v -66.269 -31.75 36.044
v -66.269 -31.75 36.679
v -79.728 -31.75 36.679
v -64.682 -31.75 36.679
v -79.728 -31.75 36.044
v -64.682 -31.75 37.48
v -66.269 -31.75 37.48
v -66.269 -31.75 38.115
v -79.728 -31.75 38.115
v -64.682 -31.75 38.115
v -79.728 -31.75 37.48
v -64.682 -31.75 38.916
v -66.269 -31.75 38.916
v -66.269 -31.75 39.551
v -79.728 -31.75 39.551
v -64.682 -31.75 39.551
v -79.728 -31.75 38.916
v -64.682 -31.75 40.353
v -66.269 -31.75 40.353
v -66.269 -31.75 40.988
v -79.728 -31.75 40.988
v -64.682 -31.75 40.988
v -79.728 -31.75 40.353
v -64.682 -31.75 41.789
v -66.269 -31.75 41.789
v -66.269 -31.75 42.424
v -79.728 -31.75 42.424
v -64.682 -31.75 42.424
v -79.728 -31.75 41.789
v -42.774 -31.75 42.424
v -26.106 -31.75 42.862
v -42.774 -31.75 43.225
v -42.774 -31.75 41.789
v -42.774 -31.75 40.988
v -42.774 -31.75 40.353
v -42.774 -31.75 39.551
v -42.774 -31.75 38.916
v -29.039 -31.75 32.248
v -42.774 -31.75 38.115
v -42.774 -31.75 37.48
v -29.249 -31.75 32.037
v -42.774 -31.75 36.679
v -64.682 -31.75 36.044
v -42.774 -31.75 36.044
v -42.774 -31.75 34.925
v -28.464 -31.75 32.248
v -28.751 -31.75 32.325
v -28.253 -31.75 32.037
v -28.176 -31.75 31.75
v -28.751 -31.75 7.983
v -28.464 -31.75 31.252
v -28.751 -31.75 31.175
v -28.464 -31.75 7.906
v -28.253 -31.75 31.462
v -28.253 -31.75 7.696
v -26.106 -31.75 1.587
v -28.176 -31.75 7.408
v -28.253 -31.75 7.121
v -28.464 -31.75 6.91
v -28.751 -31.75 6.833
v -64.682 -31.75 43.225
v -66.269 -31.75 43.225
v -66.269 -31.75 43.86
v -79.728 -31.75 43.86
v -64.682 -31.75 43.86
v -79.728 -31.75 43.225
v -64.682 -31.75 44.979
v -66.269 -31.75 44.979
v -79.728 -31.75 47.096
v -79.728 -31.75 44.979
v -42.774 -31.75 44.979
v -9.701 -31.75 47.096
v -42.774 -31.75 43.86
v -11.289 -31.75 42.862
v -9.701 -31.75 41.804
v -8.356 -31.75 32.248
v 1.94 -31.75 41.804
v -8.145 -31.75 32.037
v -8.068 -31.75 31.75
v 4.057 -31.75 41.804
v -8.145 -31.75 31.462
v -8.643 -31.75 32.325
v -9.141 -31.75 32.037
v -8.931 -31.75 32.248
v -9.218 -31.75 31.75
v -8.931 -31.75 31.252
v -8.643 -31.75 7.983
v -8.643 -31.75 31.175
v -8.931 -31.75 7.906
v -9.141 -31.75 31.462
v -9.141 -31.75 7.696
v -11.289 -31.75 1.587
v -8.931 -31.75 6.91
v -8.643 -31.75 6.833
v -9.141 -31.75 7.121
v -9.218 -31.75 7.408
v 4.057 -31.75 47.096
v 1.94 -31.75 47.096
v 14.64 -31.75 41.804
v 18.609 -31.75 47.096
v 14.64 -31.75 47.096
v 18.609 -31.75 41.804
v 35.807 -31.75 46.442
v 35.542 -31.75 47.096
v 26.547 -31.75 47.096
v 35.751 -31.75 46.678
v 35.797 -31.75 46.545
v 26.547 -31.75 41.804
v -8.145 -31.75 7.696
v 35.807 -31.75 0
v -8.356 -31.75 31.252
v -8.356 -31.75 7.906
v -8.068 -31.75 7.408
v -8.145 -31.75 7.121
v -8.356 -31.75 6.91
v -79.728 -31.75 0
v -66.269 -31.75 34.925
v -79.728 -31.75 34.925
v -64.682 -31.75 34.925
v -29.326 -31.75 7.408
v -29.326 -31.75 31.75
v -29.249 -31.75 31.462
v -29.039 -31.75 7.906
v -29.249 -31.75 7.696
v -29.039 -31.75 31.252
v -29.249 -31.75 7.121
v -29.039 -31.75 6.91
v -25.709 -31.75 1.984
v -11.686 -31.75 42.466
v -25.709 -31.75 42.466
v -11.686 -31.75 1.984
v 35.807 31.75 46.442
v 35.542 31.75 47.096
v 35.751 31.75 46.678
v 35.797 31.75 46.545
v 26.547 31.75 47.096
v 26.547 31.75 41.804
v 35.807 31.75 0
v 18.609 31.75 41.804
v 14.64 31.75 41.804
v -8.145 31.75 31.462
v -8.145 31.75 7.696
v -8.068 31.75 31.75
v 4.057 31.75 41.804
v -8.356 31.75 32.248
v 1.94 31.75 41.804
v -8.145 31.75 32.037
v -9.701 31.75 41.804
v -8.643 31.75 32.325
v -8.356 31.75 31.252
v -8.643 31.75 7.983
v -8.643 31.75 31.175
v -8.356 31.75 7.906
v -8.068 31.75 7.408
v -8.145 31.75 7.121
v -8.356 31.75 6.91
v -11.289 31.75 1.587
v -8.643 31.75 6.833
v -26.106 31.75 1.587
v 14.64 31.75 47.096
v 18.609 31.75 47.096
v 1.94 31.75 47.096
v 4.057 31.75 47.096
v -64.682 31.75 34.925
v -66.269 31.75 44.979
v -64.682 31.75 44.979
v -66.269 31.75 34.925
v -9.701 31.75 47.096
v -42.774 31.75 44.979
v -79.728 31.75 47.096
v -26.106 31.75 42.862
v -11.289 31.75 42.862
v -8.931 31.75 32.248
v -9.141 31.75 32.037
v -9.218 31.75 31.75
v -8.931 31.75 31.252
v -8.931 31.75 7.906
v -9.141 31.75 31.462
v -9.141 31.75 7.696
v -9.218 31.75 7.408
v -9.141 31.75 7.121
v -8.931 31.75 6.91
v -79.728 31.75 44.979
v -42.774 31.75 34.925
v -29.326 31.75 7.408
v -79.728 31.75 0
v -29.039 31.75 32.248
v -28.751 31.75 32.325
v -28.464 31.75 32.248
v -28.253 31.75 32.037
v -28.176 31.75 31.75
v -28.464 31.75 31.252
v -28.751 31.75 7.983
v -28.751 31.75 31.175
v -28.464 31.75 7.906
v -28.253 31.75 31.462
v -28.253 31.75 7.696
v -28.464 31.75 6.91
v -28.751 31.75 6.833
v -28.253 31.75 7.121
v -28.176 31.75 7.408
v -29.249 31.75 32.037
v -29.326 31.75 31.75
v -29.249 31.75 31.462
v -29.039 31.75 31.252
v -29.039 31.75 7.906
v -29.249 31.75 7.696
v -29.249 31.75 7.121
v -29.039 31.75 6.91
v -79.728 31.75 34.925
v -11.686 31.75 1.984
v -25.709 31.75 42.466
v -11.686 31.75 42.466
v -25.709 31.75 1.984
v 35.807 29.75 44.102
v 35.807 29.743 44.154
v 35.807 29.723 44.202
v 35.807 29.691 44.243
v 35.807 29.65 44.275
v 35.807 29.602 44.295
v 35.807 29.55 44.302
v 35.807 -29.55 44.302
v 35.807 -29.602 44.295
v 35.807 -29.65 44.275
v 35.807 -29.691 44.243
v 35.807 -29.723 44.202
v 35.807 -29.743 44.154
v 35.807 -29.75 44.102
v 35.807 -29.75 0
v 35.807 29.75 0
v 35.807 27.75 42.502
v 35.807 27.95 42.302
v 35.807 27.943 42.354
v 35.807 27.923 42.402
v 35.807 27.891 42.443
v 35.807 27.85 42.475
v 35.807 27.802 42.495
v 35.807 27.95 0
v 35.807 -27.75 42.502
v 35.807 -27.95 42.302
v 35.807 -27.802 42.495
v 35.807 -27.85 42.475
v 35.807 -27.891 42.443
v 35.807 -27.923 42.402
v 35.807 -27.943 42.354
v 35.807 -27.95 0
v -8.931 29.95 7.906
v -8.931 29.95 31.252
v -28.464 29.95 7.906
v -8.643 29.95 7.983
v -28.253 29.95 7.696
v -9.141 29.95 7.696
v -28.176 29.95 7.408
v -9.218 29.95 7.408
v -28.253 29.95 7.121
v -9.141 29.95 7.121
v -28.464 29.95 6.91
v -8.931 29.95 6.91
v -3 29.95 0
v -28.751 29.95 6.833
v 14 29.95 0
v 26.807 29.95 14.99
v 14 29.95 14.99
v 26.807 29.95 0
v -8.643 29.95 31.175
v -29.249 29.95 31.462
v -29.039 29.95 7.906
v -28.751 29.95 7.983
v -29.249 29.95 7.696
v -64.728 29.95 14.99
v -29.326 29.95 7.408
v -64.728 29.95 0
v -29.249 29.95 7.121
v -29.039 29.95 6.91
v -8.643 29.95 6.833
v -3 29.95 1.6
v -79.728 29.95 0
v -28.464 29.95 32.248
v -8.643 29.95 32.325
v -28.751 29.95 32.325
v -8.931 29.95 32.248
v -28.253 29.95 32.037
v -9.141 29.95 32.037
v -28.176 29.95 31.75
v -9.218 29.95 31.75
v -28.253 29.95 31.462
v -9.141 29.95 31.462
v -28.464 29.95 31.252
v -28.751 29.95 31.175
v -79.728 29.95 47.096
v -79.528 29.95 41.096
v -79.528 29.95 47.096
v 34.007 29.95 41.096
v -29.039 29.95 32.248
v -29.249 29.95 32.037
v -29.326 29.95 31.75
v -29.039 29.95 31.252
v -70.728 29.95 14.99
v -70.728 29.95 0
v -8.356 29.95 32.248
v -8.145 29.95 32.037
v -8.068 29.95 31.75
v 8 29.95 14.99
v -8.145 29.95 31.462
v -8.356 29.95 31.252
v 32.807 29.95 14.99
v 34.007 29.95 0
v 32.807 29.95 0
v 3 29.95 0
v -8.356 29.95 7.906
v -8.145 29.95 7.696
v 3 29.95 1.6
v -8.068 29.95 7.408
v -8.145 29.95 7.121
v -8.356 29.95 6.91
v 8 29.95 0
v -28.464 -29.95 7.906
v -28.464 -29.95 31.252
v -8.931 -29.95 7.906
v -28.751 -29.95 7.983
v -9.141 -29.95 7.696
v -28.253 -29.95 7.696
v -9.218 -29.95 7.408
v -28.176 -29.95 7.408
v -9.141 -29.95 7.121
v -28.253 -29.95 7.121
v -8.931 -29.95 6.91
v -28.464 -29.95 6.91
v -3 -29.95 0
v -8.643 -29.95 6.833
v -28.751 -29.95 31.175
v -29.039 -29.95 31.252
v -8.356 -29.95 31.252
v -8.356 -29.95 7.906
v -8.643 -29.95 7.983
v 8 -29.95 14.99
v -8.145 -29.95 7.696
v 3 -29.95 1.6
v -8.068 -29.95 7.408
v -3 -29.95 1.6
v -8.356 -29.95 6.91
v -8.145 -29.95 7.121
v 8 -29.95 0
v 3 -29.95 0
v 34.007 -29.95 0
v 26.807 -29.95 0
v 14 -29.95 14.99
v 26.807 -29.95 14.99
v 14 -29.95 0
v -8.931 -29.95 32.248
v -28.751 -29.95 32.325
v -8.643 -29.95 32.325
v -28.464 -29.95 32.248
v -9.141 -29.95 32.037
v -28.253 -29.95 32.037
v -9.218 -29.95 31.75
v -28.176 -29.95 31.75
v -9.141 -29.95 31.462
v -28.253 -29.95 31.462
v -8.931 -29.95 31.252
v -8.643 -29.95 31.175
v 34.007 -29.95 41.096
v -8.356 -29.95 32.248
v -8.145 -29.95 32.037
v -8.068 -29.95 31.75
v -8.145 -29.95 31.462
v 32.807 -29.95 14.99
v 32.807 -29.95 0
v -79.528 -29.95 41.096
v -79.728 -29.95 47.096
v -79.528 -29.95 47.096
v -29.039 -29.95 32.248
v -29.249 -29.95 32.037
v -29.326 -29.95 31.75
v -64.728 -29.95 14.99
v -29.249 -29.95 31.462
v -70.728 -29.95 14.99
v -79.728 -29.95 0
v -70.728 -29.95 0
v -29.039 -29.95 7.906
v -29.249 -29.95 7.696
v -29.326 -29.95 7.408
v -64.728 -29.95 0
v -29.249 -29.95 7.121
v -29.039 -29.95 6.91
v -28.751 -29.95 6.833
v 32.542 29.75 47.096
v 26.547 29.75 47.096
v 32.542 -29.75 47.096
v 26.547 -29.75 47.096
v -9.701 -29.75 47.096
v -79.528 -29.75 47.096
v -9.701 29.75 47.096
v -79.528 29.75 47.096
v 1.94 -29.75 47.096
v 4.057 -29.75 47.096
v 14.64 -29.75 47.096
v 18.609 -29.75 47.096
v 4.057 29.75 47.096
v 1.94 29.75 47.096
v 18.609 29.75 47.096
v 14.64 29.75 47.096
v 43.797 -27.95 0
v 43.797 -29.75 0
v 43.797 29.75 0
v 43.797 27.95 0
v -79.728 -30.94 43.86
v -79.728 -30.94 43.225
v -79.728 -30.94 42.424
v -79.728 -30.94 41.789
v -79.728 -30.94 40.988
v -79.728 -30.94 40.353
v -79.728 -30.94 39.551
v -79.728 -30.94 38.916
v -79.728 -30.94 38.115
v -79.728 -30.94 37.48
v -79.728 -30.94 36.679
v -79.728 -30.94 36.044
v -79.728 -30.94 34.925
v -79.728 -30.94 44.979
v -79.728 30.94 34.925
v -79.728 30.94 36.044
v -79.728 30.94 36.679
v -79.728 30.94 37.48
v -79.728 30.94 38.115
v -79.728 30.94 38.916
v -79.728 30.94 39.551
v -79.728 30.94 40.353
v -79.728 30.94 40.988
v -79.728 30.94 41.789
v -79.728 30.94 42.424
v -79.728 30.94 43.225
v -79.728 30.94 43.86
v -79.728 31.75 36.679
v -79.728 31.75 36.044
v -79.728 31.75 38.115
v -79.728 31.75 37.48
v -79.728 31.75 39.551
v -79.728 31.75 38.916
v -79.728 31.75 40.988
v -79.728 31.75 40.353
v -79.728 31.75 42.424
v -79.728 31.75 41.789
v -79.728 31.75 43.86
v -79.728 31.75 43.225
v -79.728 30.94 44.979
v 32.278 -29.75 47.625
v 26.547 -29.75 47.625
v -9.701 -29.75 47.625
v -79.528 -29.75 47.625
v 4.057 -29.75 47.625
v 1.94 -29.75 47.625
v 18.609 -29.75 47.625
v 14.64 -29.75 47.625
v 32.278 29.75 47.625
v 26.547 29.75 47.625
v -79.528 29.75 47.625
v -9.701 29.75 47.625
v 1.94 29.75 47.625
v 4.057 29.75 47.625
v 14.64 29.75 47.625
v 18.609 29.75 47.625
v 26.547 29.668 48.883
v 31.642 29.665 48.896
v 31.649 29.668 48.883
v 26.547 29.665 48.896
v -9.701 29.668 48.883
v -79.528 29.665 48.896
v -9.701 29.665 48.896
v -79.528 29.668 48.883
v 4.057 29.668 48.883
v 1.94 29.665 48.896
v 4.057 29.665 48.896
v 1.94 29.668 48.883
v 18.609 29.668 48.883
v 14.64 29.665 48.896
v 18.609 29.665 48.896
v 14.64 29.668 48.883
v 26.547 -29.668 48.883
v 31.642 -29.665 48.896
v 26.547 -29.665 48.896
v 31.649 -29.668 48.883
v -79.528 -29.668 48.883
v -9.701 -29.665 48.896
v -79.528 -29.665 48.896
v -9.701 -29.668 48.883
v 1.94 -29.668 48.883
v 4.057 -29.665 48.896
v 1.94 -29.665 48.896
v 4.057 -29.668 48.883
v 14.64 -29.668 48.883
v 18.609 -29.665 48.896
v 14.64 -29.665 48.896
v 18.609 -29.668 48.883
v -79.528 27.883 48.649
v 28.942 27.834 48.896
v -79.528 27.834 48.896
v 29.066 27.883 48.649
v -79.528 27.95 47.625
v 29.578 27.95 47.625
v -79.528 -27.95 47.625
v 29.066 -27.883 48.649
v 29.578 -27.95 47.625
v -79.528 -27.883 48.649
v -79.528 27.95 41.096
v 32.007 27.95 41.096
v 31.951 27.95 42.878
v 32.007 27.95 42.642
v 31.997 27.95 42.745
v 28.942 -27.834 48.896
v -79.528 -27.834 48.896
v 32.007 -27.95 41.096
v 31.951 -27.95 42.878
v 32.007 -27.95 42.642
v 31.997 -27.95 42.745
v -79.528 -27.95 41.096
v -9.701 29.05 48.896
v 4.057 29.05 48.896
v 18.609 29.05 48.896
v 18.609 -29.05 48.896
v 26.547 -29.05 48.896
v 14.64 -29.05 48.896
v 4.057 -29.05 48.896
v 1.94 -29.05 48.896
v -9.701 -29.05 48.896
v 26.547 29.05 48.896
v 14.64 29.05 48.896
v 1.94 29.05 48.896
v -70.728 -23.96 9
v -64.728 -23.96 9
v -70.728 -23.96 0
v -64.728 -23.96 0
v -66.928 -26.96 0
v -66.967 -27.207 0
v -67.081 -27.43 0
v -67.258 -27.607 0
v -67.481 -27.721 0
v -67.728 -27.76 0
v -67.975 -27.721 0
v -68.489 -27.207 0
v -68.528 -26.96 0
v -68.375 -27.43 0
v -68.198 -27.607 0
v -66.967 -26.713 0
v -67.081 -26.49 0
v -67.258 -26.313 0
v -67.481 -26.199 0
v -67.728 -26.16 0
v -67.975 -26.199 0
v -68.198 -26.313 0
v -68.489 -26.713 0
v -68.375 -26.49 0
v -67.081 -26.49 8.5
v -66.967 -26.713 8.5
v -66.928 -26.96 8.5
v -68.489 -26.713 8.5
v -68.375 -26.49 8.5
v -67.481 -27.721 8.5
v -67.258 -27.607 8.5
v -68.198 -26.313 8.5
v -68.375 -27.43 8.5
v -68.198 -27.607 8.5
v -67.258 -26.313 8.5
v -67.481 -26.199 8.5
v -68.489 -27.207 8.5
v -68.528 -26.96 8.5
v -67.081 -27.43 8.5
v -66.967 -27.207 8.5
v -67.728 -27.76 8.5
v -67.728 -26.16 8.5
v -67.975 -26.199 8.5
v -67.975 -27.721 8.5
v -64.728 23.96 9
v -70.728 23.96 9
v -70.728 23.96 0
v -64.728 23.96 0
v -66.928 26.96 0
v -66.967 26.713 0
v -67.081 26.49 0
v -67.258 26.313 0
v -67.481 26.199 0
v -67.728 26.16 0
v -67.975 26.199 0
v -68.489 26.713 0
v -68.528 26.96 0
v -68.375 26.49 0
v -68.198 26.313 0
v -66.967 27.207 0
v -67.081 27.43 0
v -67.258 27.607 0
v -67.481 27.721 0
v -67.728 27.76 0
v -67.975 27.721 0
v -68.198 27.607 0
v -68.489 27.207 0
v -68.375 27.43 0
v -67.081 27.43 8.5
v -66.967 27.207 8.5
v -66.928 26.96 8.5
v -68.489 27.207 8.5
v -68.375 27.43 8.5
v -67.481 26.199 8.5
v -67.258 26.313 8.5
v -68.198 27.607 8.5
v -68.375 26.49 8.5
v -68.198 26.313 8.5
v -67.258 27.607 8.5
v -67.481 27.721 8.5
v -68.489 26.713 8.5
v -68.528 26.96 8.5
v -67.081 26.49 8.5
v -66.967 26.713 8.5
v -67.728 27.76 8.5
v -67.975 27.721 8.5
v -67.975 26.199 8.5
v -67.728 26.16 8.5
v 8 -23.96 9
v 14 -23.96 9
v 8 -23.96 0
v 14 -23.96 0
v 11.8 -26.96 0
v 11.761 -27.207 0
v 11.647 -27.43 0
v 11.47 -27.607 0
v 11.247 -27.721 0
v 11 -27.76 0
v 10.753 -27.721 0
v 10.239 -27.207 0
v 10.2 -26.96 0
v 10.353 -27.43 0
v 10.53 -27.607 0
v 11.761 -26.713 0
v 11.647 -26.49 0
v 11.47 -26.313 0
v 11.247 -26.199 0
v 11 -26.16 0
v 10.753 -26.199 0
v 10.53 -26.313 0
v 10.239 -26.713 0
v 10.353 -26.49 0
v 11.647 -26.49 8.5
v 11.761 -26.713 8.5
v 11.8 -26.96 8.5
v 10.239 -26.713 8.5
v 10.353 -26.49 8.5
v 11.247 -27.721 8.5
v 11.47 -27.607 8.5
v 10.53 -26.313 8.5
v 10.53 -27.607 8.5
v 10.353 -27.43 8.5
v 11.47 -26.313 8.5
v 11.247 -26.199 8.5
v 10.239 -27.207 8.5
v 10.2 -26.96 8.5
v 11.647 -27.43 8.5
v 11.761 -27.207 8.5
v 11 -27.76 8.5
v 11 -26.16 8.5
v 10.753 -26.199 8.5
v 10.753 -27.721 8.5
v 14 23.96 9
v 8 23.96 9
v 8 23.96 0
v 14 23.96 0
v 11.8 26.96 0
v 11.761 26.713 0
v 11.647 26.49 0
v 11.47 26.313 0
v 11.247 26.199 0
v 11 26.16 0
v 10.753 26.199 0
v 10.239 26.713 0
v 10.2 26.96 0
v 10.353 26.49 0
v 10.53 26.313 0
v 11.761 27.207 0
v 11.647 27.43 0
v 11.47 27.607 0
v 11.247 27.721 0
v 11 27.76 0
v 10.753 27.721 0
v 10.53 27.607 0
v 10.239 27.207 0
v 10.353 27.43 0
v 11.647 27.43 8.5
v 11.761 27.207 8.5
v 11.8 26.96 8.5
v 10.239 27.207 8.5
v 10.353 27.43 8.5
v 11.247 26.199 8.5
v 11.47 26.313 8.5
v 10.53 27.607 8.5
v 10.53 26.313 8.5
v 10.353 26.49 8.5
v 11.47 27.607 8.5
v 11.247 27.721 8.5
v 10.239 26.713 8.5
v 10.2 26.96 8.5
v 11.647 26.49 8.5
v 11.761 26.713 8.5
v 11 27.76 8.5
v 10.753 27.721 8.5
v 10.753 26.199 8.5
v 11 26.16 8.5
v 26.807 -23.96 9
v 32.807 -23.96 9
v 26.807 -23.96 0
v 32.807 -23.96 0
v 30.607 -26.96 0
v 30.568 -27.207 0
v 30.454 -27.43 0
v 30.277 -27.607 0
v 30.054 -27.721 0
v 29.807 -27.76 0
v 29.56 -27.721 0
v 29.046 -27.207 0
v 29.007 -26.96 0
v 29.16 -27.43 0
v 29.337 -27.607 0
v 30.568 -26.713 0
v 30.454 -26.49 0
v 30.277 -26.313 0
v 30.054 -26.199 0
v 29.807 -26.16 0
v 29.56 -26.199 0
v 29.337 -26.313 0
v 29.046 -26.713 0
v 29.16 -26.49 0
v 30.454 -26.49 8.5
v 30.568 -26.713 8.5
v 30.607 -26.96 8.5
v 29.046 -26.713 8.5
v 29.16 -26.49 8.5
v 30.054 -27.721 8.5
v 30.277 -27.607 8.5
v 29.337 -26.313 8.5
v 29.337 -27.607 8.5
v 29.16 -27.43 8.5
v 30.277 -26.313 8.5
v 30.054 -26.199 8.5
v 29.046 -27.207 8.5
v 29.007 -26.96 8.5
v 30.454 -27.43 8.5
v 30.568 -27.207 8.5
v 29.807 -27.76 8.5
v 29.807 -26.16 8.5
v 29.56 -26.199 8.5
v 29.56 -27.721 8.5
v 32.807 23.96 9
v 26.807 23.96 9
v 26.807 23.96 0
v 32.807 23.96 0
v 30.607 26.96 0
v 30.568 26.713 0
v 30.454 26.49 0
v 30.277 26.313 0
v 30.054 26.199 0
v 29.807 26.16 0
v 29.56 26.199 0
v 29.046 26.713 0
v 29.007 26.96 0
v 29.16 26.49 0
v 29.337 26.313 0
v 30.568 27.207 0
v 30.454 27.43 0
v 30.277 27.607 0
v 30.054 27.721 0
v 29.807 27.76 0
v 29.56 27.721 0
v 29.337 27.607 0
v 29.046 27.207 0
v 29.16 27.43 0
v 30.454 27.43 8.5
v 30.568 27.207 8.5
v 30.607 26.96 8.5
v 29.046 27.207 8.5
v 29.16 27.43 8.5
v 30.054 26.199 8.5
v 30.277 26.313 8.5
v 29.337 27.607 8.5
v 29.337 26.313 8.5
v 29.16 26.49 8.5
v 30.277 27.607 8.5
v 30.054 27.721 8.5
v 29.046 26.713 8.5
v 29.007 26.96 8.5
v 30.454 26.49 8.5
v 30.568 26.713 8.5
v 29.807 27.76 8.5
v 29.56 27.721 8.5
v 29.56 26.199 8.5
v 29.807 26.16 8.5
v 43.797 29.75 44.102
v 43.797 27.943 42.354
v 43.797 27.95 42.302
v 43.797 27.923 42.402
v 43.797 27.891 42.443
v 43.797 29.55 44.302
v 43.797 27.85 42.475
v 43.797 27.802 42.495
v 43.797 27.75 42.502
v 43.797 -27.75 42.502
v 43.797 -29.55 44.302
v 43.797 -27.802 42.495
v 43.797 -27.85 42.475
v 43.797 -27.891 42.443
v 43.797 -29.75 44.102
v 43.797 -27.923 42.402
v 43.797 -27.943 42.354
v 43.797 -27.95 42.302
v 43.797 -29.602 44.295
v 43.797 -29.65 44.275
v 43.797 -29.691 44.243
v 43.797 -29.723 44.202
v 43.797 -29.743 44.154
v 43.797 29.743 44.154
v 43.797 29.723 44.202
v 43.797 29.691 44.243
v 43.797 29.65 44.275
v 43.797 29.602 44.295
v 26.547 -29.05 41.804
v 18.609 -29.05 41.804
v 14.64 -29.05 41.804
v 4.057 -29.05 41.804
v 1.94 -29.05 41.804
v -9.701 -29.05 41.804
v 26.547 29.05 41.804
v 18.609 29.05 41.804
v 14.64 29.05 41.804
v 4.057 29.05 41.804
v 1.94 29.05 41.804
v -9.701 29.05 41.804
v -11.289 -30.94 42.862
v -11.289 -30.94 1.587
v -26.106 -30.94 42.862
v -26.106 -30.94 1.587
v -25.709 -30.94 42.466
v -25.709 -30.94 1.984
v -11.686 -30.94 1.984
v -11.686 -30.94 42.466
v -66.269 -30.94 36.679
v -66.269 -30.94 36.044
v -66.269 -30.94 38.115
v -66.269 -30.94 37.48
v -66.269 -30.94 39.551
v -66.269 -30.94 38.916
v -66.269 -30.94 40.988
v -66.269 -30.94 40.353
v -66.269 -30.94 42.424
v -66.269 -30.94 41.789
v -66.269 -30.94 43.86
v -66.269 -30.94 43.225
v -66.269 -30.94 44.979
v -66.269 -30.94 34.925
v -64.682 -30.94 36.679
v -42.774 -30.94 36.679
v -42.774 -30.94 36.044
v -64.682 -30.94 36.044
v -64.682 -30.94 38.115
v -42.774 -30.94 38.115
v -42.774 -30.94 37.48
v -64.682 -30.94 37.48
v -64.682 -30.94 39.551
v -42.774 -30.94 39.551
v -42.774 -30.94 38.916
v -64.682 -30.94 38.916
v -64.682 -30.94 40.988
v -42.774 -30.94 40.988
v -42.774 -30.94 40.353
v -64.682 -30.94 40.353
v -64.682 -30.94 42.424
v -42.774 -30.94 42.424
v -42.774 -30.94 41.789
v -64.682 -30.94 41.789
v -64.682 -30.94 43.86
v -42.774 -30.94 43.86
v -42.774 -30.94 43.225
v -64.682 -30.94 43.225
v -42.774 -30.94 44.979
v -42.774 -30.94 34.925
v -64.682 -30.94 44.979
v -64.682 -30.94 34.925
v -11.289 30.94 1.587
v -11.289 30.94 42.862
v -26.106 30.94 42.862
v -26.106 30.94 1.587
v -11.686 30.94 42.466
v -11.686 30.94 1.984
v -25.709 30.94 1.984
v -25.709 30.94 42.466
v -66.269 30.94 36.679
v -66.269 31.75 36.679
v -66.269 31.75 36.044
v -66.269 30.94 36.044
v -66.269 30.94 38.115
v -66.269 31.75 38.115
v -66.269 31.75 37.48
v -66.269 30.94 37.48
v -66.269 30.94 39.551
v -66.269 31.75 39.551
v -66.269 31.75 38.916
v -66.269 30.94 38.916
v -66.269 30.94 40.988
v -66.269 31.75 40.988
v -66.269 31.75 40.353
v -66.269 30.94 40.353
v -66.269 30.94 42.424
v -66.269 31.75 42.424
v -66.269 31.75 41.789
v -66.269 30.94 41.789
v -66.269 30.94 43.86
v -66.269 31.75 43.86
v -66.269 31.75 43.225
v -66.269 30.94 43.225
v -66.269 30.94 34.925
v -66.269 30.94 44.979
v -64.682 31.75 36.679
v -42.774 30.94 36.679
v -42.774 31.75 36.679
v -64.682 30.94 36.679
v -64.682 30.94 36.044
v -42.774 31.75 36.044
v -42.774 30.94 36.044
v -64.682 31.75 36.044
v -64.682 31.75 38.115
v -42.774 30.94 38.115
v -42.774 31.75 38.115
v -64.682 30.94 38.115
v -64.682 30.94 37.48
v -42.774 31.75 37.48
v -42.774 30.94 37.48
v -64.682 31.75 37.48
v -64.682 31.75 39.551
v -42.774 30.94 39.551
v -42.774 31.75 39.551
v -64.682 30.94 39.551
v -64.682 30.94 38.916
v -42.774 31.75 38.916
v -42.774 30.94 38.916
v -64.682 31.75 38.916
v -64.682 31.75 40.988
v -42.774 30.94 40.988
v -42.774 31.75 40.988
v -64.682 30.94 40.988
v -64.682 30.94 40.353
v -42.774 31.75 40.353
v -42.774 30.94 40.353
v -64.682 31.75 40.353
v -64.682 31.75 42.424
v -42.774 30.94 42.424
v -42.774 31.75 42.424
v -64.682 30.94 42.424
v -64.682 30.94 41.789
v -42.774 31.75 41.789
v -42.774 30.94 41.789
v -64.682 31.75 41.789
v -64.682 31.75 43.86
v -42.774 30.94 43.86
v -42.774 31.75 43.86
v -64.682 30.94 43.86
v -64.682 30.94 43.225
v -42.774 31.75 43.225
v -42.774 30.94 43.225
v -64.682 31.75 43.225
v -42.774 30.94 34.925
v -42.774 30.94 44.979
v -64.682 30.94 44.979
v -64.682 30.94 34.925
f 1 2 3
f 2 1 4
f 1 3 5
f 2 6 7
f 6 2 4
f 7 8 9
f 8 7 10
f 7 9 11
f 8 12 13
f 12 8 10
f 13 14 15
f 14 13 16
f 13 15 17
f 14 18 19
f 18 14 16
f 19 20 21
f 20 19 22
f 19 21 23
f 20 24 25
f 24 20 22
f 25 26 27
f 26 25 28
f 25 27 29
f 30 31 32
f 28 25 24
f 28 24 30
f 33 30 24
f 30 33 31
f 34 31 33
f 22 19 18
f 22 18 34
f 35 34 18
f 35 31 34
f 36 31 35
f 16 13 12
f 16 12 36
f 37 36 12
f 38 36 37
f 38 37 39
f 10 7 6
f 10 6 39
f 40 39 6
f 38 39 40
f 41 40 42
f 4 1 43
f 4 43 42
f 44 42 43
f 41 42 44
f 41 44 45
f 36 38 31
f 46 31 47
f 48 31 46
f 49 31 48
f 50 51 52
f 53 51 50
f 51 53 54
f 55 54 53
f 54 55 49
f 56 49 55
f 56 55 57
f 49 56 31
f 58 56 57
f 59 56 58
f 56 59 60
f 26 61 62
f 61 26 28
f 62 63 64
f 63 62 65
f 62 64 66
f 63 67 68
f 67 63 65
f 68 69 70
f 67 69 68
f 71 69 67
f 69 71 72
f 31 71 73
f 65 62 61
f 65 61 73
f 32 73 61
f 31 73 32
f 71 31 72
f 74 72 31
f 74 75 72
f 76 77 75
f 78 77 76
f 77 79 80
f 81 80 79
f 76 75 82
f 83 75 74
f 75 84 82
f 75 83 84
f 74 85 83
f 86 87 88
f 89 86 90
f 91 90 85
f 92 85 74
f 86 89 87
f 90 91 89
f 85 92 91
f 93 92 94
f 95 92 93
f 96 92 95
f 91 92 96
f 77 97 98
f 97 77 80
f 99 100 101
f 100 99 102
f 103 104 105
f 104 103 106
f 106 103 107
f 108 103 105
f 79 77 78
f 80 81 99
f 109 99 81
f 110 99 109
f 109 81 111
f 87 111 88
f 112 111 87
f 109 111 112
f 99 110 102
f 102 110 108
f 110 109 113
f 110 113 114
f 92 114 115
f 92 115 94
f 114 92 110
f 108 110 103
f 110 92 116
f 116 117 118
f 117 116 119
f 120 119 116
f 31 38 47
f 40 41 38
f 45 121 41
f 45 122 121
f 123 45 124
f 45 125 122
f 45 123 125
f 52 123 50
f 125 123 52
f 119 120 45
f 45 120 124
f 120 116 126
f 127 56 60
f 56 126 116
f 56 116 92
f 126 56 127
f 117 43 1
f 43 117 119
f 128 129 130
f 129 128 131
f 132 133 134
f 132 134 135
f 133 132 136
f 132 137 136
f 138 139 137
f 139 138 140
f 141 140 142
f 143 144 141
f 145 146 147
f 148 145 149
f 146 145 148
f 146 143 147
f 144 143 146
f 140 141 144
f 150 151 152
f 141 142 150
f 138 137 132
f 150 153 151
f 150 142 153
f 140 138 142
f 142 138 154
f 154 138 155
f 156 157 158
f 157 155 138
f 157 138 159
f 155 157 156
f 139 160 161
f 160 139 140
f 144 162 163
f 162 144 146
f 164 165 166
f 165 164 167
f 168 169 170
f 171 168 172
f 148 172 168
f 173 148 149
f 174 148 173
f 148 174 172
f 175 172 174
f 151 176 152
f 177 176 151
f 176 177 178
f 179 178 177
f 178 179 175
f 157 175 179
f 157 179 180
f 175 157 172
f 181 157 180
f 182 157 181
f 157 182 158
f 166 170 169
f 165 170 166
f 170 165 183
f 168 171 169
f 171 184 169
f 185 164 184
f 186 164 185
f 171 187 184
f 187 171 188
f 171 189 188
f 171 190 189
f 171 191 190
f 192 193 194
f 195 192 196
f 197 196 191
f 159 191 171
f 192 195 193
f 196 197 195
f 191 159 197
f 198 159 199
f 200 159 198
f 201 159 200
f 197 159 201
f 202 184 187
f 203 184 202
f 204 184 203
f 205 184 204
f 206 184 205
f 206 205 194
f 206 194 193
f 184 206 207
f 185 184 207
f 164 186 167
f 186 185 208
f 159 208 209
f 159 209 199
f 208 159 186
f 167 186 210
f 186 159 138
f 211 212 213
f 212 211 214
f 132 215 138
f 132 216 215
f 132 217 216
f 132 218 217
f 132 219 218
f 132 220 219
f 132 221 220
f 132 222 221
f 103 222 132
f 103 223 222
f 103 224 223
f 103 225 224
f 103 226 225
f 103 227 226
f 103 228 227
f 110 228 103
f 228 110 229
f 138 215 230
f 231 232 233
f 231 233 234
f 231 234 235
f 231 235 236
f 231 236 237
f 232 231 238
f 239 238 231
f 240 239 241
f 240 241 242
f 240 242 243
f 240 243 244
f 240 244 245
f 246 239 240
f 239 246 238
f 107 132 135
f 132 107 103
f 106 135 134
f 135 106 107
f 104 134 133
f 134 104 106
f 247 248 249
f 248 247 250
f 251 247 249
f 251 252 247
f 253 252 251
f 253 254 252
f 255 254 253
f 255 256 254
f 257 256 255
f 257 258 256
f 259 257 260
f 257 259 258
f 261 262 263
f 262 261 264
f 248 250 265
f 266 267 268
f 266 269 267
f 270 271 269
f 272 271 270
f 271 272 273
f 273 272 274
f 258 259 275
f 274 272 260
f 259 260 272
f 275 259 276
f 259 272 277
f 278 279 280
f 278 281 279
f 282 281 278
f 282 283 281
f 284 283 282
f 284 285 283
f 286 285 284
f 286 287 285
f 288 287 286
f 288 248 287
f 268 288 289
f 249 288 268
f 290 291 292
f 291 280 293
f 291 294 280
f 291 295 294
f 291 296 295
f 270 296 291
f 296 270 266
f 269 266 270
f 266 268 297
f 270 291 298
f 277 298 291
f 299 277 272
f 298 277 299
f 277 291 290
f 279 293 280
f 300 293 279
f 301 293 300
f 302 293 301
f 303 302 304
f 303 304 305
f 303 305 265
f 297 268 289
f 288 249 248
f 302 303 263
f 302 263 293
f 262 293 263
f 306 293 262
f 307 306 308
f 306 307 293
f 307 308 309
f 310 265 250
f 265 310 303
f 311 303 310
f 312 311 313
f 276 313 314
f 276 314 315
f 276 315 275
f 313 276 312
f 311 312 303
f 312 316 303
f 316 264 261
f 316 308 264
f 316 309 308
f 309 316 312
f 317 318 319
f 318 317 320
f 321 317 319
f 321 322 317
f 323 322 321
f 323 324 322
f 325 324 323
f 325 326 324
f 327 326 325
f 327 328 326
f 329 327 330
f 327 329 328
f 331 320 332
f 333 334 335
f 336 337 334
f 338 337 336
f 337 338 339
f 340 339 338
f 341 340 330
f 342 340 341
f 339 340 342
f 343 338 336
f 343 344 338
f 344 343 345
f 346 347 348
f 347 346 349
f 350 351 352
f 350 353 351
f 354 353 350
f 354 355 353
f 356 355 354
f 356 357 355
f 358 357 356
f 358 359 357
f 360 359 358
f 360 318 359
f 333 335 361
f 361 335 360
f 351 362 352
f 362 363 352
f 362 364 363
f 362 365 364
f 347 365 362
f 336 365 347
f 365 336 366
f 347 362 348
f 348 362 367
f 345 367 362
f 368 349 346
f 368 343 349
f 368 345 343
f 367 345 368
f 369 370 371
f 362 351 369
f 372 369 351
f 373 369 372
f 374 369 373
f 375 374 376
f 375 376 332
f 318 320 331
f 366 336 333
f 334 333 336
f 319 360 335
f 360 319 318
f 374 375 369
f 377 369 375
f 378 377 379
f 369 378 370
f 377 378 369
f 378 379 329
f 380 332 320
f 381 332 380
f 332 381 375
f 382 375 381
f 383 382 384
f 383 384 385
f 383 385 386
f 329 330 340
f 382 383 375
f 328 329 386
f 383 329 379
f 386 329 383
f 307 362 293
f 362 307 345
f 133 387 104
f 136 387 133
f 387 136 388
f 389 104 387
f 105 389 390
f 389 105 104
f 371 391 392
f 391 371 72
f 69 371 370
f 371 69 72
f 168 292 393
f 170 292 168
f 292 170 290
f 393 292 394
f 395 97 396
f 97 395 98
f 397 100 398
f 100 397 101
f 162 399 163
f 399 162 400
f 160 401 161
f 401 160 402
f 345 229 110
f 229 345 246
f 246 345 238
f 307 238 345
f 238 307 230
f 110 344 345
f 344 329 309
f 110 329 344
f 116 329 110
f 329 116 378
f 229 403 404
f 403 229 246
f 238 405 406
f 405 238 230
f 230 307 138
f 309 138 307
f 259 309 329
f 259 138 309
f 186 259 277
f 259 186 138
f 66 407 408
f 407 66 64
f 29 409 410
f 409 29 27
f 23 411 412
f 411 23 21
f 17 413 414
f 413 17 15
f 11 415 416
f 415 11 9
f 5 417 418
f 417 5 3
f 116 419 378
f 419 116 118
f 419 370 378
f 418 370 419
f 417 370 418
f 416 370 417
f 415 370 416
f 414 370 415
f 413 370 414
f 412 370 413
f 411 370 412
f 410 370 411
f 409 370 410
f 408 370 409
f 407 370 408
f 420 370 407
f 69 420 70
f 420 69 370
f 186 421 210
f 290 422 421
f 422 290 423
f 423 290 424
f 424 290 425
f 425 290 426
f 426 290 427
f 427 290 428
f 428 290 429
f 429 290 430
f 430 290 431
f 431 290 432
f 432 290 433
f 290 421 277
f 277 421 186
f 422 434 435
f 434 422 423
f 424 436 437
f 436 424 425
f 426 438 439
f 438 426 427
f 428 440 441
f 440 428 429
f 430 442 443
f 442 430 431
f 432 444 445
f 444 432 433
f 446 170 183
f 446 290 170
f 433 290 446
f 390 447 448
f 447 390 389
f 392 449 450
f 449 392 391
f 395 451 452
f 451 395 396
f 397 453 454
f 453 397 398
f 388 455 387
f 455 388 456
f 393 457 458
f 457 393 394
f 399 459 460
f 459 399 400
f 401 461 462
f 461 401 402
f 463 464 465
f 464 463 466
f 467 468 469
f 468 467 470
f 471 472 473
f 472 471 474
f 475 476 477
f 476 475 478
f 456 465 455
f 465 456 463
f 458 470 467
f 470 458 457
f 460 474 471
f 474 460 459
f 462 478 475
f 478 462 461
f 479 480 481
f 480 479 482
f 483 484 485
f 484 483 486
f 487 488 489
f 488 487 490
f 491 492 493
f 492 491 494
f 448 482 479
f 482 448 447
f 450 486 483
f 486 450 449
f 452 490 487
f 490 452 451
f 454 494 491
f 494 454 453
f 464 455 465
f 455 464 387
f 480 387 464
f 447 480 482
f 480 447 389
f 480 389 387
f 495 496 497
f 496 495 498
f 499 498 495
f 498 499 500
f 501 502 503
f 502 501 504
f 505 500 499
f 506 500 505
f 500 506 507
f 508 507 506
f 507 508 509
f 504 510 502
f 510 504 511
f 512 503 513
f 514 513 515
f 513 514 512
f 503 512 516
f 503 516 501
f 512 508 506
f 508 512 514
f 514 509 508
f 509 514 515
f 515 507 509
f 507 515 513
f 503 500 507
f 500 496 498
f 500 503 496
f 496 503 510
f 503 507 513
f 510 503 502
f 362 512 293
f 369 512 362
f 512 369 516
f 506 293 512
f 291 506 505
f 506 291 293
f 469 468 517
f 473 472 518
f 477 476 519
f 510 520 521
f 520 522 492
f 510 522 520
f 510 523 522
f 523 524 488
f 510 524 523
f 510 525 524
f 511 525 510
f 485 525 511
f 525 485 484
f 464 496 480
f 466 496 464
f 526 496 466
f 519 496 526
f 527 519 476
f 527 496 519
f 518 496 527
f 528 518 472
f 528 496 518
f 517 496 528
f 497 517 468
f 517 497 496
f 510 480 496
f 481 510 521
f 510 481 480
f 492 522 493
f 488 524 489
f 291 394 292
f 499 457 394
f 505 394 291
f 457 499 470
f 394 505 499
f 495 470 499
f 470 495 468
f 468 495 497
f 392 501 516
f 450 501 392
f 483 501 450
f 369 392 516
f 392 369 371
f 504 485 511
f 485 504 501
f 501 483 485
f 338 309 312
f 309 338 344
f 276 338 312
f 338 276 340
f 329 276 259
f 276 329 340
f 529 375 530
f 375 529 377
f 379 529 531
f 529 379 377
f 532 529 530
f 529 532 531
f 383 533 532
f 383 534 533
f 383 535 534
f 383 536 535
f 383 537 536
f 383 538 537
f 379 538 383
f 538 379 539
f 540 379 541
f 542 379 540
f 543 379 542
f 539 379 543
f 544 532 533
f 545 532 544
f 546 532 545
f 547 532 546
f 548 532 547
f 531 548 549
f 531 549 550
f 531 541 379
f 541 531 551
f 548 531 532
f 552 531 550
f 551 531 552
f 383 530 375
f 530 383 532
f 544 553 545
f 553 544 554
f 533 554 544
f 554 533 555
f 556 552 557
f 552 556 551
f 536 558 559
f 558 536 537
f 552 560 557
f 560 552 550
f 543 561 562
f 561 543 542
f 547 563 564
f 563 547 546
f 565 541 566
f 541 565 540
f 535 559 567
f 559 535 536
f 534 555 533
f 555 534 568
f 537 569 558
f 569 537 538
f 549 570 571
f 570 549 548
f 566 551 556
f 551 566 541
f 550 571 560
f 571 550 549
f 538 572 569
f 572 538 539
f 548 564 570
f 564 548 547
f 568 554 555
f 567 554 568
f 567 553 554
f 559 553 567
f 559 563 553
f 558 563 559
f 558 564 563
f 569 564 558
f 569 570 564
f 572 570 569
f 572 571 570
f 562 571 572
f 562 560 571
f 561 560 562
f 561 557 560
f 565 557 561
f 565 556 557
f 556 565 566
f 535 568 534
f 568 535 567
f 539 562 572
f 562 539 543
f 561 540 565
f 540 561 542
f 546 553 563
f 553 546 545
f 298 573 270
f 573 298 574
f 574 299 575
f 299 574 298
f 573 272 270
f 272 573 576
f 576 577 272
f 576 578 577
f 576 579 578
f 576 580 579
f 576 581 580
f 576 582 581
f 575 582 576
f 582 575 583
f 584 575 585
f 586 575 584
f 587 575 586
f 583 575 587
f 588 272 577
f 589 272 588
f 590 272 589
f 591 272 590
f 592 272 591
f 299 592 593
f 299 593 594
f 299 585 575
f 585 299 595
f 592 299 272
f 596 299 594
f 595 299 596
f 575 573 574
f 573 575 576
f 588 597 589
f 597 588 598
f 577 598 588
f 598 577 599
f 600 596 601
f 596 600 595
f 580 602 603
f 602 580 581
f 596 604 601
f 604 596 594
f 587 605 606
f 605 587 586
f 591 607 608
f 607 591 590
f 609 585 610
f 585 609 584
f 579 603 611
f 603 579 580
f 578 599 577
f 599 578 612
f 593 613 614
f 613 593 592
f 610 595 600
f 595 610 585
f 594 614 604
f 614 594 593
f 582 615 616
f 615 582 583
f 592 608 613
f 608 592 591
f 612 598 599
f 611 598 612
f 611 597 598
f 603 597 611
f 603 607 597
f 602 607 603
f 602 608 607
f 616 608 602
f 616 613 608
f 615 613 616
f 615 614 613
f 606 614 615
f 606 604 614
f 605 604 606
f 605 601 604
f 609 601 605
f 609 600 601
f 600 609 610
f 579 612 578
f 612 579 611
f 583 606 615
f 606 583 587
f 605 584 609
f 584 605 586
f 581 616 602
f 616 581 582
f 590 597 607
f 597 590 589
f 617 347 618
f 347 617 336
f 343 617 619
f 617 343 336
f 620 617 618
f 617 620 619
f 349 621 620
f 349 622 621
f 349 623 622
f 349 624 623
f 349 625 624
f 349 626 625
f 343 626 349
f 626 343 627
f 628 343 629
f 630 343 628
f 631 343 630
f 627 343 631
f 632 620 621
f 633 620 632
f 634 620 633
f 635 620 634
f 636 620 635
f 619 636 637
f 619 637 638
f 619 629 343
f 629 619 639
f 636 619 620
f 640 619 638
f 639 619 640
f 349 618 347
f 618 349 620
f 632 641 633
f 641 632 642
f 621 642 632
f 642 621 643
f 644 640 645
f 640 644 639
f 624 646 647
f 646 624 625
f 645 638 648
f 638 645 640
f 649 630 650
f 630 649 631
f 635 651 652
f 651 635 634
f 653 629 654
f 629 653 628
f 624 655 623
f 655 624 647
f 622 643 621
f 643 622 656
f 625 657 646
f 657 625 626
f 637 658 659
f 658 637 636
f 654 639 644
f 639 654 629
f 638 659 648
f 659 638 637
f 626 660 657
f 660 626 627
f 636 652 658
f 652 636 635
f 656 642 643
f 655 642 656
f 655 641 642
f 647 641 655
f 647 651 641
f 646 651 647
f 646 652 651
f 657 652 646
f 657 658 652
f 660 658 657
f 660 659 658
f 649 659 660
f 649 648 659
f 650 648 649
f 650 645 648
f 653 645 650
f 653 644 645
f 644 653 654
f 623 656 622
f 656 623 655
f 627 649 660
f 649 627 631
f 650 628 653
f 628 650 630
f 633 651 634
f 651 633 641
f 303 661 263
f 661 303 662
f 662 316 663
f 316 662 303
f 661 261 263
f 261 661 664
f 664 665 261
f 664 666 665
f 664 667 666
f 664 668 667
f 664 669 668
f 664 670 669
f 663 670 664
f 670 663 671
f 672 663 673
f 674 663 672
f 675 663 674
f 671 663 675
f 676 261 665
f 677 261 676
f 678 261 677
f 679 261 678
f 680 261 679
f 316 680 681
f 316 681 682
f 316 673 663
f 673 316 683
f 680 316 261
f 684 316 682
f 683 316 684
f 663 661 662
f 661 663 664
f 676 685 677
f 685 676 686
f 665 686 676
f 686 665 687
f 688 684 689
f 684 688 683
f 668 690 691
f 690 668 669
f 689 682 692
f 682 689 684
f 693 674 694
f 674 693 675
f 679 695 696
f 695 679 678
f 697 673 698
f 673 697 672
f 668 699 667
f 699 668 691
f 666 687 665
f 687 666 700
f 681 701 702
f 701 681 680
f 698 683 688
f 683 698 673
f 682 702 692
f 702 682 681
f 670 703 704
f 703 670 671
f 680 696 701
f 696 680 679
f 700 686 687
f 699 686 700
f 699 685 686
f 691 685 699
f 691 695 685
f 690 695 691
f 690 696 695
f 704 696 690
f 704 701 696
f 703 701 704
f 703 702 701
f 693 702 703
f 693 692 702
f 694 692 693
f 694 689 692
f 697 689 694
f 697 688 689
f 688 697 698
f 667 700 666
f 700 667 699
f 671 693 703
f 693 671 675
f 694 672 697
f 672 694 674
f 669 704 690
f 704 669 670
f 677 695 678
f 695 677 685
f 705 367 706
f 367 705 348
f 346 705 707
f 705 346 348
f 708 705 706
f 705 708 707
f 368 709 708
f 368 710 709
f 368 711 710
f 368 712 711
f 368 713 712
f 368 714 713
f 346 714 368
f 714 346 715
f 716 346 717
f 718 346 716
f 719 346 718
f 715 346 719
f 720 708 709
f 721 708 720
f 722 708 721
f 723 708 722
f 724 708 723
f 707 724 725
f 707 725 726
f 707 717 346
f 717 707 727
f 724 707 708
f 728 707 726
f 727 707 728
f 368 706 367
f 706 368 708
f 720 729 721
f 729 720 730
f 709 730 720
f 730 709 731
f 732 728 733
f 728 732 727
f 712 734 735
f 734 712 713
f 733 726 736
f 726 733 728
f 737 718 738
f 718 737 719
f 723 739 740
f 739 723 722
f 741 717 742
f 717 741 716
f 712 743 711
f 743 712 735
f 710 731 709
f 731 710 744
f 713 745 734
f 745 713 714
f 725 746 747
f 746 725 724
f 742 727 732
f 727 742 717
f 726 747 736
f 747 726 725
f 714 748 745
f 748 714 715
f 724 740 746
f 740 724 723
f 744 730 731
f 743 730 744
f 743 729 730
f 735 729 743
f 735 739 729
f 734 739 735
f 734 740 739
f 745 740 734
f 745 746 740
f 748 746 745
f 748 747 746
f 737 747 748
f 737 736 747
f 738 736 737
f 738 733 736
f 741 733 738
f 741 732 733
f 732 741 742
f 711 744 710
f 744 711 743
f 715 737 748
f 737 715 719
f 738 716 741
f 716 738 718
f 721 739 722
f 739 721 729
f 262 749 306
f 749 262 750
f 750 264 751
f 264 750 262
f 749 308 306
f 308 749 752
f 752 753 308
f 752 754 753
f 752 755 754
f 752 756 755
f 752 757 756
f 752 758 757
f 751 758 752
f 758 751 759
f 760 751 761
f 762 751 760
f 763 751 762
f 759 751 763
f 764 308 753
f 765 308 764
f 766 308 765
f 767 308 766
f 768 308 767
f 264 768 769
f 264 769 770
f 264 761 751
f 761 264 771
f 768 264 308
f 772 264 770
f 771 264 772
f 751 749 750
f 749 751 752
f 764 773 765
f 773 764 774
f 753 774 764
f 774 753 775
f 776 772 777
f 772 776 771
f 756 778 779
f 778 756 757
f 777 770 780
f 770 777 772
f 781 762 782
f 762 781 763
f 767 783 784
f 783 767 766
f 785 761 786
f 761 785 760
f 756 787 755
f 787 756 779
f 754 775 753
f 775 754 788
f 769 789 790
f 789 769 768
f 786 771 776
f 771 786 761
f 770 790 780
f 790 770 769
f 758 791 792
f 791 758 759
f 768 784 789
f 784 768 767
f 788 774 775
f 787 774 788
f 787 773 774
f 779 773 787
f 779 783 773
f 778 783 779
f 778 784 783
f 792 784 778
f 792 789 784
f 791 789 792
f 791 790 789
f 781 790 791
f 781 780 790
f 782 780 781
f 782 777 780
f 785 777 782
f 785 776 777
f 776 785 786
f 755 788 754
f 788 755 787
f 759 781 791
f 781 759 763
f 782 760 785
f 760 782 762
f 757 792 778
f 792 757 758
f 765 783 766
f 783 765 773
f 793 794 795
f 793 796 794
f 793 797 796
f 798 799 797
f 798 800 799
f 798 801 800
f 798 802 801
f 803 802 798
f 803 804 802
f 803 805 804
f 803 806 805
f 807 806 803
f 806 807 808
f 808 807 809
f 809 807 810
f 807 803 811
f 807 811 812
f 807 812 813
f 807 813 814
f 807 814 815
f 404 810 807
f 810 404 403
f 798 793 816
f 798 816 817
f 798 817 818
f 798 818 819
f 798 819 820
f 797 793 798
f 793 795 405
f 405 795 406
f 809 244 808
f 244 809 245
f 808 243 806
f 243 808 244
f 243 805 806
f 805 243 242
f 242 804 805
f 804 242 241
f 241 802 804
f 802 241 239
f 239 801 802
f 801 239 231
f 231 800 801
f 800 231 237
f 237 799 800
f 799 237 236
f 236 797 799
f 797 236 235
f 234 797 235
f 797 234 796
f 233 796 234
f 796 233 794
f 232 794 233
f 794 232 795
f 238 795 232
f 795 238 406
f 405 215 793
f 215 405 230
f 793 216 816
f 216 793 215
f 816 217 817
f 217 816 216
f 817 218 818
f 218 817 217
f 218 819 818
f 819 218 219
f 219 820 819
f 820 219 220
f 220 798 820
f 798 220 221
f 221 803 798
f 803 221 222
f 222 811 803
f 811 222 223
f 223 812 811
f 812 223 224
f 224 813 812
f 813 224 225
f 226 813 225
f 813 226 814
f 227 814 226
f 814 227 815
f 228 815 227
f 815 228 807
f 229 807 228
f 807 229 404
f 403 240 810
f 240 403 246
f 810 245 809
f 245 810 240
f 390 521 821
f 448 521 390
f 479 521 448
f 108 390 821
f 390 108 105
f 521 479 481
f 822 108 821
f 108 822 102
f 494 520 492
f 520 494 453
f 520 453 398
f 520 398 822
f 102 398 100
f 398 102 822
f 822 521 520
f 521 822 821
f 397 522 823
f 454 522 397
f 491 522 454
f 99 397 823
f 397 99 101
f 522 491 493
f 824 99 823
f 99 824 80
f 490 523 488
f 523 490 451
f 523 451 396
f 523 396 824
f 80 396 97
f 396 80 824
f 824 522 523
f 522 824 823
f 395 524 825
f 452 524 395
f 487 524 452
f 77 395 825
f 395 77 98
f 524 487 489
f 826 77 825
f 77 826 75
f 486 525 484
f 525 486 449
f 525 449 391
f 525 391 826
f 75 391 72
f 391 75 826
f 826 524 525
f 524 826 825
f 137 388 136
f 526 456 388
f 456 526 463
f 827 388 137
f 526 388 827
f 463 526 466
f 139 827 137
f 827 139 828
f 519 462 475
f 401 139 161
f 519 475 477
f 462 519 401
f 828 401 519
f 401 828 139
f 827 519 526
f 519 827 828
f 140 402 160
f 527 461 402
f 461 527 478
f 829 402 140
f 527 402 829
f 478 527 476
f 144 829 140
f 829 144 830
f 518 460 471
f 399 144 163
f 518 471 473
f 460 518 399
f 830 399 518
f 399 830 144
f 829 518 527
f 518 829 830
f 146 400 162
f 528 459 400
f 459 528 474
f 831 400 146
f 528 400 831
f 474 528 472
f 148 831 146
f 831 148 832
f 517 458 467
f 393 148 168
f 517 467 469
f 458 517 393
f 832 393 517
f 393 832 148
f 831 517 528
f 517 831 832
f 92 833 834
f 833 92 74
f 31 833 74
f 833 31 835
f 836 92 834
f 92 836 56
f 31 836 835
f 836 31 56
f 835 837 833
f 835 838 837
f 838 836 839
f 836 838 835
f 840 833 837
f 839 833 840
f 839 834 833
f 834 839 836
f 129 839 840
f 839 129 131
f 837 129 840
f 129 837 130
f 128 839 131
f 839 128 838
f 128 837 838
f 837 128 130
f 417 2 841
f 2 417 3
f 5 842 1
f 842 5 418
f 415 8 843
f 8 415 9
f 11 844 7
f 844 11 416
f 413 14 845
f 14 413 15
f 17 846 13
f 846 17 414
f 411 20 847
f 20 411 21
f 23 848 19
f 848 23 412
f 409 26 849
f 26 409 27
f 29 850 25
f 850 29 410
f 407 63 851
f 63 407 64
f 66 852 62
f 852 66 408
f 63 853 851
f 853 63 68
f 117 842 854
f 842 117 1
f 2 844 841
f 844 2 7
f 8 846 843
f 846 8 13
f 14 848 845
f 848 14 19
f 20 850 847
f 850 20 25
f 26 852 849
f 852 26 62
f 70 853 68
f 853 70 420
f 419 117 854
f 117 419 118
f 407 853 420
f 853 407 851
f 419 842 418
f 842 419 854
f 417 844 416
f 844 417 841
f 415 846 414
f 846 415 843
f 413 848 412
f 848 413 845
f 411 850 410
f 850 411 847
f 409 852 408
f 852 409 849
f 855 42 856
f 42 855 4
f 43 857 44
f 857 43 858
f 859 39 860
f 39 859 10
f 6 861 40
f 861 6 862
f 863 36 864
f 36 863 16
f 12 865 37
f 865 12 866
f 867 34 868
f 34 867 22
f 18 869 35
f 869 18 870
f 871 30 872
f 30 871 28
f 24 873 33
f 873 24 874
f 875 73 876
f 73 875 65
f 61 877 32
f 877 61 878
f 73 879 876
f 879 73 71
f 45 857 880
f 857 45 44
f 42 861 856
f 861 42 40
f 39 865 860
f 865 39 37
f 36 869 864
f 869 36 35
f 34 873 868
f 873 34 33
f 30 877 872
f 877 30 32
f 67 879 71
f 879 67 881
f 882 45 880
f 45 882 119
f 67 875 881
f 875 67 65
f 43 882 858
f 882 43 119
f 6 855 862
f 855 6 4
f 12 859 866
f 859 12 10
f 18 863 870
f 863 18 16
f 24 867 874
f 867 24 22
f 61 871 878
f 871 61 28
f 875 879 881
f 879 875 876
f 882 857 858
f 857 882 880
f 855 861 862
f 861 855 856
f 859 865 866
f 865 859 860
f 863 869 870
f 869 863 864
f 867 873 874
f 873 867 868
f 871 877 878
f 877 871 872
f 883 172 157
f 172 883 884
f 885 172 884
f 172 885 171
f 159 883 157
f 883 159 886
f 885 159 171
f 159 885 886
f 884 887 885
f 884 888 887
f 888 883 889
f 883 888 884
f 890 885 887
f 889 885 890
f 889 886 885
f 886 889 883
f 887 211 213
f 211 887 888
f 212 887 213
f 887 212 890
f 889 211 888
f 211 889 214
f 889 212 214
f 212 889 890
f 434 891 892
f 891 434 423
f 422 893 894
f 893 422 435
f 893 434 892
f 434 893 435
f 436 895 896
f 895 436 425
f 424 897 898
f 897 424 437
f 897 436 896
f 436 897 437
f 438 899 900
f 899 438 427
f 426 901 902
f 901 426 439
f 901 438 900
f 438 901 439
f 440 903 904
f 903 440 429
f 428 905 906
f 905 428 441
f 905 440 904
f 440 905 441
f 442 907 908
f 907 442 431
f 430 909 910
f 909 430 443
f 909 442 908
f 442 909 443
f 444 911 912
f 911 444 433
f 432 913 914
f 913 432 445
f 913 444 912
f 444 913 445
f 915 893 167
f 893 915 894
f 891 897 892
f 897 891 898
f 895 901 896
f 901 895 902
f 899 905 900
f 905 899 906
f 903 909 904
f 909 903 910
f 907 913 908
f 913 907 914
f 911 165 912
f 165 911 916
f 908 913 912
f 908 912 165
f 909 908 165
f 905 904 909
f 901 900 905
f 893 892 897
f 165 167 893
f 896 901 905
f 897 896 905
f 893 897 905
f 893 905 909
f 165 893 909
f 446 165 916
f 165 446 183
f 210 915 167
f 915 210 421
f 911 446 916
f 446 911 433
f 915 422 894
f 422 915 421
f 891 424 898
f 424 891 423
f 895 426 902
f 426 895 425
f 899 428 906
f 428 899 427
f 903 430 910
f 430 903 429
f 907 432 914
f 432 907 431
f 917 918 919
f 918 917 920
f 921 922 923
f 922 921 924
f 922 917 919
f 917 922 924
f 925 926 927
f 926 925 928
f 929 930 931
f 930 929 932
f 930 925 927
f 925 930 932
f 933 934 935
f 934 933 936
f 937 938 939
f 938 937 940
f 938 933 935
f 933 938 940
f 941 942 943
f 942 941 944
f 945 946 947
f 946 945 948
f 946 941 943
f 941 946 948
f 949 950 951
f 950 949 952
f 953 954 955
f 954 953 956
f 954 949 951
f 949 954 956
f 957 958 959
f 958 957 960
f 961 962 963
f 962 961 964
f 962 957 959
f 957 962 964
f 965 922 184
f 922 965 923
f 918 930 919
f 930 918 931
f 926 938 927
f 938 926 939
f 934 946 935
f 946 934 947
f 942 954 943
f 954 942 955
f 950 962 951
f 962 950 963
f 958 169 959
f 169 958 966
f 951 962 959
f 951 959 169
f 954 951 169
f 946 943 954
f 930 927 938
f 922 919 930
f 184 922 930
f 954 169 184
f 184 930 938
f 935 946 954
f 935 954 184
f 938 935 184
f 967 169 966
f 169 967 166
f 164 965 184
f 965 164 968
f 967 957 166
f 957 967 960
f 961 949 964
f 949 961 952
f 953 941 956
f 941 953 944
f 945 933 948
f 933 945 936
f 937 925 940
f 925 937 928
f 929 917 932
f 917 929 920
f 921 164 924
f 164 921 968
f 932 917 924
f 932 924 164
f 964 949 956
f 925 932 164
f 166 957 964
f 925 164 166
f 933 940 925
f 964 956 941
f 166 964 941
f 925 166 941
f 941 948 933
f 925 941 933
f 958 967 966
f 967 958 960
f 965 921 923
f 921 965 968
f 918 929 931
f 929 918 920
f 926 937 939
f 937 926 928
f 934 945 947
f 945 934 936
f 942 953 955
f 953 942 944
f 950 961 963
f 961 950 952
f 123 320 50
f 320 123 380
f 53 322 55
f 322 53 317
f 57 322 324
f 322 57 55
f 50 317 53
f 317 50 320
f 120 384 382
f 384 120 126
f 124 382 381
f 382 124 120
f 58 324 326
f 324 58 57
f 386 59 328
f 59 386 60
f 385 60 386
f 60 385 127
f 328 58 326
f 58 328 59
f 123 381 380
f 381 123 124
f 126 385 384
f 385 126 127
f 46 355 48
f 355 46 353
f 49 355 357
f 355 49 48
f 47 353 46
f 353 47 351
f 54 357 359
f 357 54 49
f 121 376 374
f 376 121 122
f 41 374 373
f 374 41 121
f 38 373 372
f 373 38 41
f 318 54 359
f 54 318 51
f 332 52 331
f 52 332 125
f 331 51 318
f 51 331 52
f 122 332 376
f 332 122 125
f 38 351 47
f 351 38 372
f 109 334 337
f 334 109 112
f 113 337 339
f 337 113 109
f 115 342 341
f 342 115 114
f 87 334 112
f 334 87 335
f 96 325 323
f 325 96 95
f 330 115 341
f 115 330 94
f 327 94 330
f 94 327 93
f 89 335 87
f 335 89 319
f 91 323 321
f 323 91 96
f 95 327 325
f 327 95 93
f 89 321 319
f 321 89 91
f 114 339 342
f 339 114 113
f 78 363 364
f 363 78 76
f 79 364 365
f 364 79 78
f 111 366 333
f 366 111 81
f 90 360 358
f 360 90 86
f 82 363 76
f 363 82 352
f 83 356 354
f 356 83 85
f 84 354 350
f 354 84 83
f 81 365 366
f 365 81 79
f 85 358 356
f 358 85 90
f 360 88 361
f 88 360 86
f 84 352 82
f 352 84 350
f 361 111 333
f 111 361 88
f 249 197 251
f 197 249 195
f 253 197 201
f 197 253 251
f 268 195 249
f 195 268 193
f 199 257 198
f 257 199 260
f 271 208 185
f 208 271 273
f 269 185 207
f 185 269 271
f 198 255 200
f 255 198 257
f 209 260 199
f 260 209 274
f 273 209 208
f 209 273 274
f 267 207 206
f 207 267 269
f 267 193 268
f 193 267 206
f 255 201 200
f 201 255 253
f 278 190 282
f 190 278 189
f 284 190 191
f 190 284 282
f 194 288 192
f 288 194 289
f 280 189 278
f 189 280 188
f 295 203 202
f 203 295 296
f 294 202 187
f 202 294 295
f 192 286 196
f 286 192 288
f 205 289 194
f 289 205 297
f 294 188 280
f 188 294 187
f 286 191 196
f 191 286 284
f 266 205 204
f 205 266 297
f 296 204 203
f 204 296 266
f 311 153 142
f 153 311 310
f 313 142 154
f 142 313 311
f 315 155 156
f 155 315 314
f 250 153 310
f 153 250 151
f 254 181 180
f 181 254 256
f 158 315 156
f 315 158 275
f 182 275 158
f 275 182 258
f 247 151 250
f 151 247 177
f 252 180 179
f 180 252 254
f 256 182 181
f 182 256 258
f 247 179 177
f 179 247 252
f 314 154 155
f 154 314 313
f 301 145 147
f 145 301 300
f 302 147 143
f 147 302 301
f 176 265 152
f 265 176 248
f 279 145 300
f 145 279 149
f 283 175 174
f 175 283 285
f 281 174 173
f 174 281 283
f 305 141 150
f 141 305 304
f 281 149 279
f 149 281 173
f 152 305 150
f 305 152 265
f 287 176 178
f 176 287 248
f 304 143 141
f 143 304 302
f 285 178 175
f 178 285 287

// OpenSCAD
// Milwaukee Road Little Joe, O scale 1-48 - print 3 of 17: body_3 - sides and ends, section 3 (print upright)
// Render (F6), export STL, print. Settings: ../../library/lj_params.scad
// Whole loco preview and notes: ../../MILW_LittleJoe_Main.scad
SCALE_SEL = "O";
LOCO_SEL = "E70";   // [E20, E21, E70, E71, E72, E73, E74, E75, E76, E77, E78, E79] the body and roof change for E20 / E21
include <../../library/lj_all.scad>
lj_plate("body_3");
